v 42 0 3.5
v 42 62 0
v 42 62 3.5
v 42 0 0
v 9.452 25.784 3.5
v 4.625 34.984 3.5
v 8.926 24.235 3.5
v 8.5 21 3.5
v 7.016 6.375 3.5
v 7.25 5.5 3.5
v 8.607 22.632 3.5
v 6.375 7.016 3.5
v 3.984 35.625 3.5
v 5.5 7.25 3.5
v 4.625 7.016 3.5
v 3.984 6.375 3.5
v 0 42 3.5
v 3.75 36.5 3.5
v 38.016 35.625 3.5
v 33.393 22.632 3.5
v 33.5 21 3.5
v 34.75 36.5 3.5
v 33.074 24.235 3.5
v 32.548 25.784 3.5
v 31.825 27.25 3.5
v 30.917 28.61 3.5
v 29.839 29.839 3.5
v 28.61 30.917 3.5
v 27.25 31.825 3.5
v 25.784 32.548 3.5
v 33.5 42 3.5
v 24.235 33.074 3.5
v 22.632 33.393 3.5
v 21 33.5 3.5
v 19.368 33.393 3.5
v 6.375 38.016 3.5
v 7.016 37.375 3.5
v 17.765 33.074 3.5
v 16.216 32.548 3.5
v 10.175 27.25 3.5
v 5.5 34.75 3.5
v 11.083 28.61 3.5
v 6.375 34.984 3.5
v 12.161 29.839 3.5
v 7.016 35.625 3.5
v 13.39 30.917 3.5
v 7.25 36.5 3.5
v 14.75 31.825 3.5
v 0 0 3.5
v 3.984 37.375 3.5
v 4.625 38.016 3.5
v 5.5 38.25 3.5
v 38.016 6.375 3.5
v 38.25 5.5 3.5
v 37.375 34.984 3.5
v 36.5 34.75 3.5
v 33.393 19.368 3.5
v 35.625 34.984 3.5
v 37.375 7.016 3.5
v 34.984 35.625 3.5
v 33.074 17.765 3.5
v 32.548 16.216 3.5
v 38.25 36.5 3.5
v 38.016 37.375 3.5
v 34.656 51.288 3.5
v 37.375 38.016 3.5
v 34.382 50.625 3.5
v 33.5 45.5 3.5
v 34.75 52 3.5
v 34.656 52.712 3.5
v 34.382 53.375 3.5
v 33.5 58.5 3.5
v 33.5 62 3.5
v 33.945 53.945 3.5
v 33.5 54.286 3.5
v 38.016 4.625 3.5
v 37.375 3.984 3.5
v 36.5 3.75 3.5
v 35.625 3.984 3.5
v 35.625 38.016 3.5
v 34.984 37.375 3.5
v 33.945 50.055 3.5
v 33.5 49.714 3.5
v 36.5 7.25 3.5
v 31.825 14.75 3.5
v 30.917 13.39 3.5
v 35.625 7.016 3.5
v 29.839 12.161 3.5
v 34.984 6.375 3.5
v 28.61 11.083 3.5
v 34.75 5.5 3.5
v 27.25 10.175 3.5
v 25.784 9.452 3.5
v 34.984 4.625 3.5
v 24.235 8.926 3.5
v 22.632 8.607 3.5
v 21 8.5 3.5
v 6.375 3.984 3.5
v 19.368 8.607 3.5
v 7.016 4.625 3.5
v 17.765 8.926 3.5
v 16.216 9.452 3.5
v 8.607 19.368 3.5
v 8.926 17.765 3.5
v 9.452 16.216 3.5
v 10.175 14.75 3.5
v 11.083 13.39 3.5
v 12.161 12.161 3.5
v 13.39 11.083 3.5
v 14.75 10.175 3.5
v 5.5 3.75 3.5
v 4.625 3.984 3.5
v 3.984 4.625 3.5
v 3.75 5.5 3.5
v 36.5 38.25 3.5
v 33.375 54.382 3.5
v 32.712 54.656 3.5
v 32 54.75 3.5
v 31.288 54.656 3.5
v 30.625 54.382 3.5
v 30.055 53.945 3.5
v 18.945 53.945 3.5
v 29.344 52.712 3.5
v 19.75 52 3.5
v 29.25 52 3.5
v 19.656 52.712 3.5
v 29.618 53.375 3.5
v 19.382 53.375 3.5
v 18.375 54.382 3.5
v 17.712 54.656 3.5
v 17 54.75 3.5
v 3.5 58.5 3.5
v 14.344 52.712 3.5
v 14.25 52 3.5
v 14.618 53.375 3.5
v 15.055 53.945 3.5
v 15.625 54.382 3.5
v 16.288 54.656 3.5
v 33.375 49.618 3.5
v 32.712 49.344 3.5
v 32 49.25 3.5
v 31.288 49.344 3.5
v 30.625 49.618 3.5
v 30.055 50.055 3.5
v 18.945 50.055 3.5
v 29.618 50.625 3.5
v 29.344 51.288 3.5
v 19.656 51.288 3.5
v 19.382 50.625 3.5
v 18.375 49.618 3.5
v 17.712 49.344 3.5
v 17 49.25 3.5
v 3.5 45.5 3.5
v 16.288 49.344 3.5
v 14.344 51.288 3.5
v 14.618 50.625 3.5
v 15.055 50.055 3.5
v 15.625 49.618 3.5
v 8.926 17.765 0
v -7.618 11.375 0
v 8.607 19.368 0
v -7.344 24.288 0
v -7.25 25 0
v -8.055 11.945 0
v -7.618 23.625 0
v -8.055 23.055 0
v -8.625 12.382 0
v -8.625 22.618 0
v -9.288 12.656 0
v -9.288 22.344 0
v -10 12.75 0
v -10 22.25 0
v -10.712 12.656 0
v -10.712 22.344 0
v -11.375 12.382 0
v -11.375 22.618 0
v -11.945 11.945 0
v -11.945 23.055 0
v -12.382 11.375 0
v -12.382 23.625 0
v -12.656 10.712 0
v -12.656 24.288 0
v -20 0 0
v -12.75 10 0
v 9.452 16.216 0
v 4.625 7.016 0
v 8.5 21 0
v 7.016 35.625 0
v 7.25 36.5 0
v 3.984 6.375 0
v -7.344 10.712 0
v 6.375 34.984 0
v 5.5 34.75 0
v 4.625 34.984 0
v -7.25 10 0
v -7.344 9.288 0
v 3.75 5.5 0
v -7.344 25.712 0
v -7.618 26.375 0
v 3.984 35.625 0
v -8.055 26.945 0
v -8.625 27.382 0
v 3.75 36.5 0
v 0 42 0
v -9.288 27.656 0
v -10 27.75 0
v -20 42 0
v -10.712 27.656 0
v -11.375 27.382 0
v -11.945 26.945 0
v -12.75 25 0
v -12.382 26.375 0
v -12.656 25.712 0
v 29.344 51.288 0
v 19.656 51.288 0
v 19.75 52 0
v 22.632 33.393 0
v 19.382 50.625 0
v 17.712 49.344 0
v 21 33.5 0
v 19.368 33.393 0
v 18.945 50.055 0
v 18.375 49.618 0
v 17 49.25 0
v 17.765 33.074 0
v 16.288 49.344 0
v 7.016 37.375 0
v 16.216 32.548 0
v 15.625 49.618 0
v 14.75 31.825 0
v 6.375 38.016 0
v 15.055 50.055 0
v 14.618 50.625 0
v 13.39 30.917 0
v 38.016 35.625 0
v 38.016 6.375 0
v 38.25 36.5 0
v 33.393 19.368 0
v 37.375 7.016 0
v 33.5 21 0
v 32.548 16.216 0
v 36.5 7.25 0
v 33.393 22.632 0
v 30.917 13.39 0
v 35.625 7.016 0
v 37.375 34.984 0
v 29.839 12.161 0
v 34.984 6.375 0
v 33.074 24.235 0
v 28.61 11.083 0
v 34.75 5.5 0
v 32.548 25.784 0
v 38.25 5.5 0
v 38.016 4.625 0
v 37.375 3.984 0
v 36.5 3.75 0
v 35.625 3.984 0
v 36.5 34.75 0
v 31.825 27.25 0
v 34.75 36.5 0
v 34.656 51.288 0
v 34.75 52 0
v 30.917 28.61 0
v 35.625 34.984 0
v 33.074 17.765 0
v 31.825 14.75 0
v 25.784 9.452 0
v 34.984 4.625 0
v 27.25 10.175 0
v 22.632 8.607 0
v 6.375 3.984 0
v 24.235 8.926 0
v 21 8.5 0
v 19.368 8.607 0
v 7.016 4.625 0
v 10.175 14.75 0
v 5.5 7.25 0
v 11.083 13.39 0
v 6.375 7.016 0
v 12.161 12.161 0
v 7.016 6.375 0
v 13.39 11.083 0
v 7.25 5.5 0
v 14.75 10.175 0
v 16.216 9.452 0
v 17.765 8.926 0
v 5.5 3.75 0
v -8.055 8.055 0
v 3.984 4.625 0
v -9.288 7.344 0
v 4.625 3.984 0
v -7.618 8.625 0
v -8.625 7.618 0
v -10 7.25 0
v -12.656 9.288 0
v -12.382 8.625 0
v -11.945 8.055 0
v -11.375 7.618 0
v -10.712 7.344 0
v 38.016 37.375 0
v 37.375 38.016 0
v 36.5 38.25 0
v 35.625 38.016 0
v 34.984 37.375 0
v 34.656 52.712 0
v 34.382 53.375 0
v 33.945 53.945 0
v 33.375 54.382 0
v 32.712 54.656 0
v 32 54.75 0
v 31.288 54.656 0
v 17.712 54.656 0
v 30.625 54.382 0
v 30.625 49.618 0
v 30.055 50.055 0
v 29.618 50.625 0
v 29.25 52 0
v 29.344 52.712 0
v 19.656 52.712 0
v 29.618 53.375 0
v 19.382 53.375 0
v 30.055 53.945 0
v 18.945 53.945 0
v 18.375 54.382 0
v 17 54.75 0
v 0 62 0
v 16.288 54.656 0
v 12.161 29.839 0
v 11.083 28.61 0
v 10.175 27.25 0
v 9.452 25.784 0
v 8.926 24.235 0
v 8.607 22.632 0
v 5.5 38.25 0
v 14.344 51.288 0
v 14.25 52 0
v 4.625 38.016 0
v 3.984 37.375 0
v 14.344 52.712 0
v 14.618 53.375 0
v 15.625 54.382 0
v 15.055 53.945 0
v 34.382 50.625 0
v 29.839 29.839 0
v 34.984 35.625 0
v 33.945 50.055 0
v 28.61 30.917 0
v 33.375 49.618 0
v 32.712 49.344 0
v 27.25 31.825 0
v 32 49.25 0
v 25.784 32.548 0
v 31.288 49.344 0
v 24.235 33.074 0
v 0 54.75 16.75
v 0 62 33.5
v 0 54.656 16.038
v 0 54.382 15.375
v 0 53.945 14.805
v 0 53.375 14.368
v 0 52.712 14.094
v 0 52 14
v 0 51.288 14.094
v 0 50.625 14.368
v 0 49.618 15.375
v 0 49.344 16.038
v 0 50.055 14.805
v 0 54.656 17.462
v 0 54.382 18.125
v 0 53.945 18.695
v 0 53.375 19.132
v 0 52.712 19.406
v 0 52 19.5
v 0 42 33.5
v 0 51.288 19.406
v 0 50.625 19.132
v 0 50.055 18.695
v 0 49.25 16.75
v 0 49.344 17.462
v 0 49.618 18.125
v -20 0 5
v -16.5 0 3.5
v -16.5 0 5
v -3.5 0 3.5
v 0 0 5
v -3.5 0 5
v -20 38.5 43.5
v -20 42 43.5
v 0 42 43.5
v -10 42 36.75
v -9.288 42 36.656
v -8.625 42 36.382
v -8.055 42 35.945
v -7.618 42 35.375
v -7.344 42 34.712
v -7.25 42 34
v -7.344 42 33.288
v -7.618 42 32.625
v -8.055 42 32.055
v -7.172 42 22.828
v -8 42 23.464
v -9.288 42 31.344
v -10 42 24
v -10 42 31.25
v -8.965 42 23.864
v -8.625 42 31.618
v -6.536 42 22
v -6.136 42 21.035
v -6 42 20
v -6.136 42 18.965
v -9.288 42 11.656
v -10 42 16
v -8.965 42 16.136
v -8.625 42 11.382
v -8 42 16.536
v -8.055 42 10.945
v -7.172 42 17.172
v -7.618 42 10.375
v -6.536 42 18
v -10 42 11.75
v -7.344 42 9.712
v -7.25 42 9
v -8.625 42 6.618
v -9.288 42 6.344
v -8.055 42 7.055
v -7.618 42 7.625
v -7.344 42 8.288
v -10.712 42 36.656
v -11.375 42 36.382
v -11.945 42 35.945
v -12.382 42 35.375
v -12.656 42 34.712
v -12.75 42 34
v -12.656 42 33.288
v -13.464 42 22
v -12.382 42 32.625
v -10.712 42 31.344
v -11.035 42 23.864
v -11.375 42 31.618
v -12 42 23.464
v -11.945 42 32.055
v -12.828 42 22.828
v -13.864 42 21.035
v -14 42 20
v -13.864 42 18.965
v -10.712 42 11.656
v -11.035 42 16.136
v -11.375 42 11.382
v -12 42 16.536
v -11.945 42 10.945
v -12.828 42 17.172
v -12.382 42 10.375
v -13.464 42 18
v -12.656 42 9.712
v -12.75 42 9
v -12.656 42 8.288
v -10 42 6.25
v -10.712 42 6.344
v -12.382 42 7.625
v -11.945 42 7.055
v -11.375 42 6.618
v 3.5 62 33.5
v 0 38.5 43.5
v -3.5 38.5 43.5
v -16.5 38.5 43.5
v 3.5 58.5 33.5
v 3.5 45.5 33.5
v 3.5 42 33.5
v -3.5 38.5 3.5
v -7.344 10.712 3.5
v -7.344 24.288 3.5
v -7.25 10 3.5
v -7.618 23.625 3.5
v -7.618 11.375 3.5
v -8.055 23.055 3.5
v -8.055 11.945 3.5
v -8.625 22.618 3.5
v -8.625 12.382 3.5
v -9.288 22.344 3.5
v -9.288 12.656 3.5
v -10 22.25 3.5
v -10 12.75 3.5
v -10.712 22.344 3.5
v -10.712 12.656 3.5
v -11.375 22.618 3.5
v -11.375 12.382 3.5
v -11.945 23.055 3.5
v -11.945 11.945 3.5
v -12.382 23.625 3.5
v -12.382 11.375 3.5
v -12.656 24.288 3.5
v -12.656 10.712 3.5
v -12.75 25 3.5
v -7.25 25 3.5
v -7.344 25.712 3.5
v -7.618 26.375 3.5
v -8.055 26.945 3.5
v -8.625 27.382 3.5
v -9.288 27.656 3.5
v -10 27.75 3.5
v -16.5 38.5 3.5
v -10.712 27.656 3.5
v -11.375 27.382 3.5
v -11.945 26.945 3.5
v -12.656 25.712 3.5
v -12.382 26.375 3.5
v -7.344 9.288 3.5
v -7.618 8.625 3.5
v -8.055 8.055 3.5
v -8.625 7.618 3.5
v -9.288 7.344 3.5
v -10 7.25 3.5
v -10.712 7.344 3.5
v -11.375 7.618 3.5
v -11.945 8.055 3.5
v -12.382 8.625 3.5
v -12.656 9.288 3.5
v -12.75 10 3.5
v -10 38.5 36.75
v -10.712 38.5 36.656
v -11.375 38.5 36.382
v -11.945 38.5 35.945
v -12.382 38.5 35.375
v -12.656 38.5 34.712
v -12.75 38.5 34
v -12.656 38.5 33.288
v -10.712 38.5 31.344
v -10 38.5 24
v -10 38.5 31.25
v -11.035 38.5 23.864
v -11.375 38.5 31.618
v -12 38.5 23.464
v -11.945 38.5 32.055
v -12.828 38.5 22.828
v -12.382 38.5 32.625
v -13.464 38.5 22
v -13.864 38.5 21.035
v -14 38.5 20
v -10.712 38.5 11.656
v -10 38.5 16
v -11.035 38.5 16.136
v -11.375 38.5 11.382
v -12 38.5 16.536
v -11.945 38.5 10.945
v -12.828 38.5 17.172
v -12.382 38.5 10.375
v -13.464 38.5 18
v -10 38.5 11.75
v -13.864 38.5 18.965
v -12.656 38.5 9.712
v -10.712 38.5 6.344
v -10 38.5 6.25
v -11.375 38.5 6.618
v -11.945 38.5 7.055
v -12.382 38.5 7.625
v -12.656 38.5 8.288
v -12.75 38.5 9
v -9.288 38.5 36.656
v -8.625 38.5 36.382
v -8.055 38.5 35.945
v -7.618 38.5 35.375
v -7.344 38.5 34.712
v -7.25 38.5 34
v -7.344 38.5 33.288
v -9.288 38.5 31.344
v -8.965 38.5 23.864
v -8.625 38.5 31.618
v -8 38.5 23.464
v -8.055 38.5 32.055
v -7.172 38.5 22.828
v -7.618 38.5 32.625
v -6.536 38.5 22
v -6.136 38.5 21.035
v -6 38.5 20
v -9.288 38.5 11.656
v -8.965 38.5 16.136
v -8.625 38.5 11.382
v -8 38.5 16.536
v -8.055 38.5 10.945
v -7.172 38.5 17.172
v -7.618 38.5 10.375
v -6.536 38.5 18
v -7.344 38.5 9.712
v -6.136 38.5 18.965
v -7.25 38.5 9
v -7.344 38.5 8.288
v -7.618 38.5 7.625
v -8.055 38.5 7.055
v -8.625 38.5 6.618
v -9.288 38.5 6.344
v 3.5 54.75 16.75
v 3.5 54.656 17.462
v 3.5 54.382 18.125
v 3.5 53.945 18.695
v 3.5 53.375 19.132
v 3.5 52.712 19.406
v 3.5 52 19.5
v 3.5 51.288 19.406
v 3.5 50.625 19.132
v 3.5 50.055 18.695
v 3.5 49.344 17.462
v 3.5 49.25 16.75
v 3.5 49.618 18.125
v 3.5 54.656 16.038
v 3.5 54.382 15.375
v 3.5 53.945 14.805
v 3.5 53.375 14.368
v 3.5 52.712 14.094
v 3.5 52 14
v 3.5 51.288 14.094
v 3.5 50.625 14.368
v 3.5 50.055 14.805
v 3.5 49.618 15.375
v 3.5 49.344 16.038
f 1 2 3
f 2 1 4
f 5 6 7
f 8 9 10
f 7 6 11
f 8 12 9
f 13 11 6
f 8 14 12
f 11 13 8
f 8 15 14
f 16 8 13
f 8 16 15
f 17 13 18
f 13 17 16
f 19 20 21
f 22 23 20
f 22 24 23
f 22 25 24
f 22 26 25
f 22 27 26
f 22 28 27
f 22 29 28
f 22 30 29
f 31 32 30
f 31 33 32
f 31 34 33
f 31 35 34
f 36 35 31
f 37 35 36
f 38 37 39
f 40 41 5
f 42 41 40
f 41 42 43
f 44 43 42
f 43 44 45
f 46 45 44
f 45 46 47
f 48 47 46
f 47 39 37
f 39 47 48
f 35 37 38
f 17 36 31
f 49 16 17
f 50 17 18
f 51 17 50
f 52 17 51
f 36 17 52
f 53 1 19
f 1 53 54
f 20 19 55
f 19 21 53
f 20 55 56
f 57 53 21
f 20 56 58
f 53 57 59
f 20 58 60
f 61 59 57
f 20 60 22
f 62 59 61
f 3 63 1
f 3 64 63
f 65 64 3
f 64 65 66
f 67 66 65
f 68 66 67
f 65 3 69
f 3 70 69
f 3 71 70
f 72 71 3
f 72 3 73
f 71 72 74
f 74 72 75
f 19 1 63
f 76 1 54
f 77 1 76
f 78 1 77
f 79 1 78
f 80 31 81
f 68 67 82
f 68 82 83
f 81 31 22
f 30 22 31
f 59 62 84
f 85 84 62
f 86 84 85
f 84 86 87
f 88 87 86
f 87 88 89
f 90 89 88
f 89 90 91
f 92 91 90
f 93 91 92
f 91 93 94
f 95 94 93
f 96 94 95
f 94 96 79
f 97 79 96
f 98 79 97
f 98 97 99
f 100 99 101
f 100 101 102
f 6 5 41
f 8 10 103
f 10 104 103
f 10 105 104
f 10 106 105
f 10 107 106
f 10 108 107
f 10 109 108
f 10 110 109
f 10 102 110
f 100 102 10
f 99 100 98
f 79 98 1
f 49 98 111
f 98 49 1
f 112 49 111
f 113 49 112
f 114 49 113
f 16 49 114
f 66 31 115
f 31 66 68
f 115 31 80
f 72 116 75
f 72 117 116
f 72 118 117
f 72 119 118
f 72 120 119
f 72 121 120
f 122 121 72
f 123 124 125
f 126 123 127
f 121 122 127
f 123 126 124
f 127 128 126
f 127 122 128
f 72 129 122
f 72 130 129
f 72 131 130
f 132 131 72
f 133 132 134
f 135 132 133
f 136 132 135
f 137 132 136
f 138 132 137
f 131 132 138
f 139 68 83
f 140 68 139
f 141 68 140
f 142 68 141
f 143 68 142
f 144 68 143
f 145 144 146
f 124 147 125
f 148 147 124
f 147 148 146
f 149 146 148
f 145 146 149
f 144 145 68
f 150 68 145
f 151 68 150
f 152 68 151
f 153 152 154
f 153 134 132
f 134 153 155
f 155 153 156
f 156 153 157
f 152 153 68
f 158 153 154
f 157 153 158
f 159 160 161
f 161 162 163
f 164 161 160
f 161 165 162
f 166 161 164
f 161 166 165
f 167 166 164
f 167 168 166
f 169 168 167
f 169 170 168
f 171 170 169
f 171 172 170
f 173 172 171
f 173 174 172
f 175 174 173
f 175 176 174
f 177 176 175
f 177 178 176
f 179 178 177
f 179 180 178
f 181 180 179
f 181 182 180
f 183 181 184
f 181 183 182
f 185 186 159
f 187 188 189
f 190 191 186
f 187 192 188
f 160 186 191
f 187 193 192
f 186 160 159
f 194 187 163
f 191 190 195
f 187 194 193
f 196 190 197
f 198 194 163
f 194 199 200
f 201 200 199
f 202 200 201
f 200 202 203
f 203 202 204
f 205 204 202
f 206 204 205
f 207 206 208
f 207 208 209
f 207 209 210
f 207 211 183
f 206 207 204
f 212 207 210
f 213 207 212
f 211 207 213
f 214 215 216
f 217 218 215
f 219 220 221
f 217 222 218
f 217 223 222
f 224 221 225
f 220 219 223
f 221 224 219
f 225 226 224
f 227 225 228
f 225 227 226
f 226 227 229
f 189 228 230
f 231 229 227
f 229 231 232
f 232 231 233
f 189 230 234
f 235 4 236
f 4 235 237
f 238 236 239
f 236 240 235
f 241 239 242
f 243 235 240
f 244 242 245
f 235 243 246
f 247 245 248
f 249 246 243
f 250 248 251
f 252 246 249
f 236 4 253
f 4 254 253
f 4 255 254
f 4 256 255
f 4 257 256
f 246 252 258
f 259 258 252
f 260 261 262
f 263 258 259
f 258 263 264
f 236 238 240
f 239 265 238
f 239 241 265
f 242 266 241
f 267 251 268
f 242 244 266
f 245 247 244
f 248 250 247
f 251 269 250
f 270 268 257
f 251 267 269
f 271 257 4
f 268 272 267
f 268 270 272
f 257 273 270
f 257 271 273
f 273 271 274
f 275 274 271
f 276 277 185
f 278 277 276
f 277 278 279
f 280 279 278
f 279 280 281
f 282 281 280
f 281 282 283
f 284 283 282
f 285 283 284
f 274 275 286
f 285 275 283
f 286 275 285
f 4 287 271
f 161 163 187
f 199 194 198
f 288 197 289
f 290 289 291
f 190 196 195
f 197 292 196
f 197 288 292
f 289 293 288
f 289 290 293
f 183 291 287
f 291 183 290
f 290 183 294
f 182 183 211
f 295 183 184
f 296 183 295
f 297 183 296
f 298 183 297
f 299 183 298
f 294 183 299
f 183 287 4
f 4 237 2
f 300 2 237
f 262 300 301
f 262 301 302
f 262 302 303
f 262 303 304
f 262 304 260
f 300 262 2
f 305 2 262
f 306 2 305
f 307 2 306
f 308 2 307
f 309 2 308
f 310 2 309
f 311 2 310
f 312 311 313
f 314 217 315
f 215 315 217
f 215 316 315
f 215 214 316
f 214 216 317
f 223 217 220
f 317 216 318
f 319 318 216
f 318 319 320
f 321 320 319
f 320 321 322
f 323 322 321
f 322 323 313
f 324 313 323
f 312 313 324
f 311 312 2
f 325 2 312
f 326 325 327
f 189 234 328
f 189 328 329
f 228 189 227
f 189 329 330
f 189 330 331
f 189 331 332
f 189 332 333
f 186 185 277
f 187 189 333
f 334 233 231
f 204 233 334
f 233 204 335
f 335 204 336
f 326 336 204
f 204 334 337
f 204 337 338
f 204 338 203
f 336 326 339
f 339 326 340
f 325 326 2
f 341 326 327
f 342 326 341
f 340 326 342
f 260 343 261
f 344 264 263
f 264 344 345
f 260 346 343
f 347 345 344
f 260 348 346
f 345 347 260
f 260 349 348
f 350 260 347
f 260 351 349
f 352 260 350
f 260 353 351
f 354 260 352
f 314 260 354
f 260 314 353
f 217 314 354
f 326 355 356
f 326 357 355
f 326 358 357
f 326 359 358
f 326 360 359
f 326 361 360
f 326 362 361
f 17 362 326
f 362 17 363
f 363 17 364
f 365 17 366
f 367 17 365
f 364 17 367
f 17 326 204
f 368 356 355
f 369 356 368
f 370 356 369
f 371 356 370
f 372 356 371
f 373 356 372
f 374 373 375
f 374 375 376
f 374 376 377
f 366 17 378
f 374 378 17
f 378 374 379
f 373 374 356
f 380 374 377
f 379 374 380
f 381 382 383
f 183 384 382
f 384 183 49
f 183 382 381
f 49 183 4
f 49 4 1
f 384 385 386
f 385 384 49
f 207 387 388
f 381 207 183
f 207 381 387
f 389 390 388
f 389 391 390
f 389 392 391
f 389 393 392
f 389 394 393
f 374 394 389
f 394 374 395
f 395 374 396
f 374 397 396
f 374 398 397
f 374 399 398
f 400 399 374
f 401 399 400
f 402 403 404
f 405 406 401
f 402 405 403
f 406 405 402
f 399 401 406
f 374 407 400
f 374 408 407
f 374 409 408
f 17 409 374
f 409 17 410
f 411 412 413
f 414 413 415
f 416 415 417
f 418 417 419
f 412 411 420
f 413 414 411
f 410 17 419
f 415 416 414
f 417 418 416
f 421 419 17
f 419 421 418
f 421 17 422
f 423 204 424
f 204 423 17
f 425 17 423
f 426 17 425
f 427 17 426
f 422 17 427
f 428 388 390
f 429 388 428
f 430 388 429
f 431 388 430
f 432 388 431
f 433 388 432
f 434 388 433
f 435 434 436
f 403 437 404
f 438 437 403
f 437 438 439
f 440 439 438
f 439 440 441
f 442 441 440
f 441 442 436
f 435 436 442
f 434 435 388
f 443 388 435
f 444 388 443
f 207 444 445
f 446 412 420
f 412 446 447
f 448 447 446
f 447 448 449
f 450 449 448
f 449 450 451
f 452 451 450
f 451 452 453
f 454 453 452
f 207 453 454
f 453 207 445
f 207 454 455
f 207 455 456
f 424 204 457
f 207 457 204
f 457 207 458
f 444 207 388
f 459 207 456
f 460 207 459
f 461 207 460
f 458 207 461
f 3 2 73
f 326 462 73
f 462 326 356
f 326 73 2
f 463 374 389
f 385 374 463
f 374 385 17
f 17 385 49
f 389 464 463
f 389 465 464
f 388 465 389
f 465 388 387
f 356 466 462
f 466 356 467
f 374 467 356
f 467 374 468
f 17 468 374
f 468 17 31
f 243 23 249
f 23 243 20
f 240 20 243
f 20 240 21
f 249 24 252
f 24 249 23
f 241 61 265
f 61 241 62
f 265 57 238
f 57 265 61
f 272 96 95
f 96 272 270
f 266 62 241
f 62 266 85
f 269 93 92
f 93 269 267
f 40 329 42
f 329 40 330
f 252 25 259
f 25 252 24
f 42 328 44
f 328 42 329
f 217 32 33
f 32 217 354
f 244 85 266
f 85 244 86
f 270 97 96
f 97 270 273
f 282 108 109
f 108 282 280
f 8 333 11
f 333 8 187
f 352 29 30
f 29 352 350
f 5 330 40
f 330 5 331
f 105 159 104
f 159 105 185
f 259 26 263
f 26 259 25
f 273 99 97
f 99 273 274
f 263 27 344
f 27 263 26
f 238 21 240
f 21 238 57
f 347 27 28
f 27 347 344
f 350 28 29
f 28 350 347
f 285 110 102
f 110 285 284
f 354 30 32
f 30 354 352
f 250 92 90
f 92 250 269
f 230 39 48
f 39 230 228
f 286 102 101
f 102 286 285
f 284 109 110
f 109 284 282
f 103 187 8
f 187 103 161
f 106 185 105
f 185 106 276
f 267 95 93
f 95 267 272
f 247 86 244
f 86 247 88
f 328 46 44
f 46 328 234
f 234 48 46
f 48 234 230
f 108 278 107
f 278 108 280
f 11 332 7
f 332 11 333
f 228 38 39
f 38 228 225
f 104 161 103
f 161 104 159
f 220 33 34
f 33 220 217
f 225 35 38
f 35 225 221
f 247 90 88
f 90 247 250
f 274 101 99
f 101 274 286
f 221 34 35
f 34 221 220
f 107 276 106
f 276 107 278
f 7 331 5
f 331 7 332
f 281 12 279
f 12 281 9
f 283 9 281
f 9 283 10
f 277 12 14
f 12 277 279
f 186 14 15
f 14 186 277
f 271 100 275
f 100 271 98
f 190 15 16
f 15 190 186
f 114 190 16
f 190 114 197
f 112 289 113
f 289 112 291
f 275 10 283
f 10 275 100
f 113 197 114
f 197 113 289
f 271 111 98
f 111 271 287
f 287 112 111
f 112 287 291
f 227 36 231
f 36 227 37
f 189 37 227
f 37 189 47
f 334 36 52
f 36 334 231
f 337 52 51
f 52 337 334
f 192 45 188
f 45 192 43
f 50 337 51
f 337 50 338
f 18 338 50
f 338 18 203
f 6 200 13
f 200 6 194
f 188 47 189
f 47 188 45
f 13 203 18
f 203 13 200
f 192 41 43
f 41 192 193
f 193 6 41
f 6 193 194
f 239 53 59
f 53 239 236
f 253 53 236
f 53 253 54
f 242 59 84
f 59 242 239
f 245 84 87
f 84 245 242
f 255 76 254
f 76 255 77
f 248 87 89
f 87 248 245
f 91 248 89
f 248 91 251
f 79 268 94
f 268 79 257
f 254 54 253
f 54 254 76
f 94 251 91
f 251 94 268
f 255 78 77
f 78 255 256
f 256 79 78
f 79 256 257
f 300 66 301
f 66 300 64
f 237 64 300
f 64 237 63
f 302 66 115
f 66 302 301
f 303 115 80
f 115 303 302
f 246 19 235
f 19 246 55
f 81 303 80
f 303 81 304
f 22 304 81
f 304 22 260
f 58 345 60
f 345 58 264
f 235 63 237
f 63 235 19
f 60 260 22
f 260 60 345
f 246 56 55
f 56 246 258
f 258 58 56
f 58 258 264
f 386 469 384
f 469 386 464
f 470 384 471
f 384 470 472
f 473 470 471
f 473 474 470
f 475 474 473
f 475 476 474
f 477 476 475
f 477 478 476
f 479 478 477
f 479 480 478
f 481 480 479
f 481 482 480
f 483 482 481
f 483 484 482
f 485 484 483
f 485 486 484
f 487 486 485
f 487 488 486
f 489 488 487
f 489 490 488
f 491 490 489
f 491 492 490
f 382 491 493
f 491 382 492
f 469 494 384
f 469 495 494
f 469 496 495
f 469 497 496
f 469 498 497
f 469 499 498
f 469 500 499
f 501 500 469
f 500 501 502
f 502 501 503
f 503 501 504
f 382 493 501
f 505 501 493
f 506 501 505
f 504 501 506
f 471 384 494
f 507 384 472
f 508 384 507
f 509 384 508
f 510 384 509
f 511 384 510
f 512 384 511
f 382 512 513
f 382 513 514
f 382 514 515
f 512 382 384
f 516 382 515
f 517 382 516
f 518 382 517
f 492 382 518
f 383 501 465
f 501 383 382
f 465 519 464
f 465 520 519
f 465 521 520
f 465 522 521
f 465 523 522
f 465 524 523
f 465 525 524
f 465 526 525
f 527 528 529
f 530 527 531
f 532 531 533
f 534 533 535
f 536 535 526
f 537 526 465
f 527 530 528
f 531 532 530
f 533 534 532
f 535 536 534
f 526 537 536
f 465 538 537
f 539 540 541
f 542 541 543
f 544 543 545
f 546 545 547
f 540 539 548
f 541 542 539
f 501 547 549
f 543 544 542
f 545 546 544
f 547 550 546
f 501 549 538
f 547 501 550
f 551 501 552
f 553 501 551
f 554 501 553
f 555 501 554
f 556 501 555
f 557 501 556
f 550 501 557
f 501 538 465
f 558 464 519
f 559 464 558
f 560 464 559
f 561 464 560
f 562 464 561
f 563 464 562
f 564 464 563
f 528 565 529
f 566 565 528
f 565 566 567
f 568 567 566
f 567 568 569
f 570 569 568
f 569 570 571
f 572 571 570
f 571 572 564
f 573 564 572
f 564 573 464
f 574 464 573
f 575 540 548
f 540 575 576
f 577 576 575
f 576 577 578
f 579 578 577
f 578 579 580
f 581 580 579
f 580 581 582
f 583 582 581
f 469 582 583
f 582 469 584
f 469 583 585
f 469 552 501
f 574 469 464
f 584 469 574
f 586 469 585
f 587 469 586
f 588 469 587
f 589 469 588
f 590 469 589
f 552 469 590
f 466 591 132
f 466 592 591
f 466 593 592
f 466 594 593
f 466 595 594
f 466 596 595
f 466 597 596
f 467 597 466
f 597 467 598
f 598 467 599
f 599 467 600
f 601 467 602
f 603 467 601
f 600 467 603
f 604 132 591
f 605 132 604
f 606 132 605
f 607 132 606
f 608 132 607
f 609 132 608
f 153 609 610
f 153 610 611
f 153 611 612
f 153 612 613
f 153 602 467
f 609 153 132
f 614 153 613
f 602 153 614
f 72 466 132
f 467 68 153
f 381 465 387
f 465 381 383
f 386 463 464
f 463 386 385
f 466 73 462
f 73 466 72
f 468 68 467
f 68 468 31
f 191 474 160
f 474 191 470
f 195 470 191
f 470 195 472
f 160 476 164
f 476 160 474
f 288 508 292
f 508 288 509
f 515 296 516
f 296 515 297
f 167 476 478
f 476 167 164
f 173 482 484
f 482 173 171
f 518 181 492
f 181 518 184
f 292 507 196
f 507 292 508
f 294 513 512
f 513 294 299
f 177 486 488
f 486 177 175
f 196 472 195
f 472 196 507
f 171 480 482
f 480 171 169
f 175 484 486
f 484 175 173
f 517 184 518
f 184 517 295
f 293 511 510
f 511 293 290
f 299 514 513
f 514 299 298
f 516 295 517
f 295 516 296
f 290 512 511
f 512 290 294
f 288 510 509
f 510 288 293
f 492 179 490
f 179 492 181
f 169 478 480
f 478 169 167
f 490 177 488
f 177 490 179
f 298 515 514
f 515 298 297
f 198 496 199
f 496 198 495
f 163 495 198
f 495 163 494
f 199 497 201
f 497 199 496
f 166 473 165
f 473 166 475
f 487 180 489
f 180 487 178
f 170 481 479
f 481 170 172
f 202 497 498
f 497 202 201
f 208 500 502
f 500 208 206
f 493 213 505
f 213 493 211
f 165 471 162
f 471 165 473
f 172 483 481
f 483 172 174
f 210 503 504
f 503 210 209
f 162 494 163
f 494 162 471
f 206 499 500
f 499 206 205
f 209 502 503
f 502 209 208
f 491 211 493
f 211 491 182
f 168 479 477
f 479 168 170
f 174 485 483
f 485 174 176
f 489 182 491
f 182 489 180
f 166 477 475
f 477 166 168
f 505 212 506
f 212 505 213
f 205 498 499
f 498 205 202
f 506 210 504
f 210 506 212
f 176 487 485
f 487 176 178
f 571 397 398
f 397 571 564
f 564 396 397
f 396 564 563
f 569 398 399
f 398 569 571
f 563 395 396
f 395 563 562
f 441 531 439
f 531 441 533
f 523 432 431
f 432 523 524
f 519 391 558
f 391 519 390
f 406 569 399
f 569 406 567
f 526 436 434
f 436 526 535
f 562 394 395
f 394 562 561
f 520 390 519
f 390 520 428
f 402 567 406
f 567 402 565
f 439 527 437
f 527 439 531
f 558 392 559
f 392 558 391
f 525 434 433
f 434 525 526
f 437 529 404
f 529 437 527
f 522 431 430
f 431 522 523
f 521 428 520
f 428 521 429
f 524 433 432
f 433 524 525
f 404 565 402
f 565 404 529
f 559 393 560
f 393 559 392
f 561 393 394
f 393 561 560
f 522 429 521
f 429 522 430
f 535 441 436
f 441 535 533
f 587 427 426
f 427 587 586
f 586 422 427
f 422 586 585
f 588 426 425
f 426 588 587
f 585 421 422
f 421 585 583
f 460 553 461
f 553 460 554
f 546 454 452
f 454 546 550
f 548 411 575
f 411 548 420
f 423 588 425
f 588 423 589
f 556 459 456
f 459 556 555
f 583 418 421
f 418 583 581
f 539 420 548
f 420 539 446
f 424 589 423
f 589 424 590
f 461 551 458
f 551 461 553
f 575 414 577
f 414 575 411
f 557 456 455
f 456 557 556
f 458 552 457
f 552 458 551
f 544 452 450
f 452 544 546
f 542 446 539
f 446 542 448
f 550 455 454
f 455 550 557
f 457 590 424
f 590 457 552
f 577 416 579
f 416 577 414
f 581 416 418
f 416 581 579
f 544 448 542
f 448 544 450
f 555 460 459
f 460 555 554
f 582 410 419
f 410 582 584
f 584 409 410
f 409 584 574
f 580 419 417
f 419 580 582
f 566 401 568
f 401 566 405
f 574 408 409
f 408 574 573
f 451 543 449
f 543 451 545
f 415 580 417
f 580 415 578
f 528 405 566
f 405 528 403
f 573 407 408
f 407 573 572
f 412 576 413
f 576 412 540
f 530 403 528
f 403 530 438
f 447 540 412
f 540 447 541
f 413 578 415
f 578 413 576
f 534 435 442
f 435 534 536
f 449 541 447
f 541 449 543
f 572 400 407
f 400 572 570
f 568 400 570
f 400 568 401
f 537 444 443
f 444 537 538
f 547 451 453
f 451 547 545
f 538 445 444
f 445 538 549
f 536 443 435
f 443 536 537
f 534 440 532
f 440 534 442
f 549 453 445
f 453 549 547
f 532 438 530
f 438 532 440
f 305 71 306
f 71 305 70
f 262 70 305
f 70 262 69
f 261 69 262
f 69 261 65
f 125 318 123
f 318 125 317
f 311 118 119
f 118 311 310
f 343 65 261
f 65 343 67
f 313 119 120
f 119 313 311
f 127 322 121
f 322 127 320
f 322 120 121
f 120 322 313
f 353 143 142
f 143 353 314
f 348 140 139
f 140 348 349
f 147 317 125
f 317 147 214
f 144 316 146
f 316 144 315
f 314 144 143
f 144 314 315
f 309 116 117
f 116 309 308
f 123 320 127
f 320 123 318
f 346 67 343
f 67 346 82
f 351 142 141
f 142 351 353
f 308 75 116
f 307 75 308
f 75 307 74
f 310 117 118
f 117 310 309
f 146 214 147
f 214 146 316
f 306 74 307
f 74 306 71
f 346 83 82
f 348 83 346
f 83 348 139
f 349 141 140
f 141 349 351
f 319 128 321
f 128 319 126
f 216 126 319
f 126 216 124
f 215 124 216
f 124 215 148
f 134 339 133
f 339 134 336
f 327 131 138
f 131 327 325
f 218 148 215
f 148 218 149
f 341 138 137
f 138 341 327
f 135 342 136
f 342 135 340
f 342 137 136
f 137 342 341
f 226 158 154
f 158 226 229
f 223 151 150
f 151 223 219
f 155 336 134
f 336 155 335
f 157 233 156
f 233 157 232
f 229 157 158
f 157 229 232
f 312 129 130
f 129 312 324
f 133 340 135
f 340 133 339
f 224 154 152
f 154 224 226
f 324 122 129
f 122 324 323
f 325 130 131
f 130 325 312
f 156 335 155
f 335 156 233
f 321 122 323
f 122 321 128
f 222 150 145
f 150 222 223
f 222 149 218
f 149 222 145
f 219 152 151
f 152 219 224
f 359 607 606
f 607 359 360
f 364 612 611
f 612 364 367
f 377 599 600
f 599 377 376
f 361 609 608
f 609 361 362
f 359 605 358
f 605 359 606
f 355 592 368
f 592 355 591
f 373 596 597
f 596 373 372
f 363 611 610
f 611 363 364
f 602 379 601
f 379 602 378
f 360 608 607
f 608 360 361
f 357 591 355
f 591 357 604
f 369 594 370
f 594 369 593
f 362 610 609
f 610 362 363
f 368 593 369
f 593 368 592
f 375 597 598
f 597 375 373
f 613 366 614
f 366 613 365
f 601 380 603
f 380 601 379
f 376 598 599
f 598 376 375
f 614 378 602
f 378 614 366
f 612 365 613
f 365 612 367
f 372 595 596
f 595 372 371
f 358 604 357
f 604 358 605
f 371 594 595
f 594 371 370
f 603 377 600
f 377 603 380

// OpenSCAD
t=3.5;

difference()
{
    union()
    {
        cube([42,42,t]);
        
        translate([-20,0,0])
            cube([20,42,t]);
        translate([0,42,0])
            cube([42,20,t]);
        
        translate([-20,0,t])
            cube([20,42,40]);
        translate([0,42,t])
            cube([33.5,20,30]);
    }
    
    union()
    {
        translate([21,21,0])
            cylinder(d=25,h=t,$fn=48);
        
        translate([21-31/2,21-31/2,0])
            cylinder(d=3.5,h=t,$fn=12);
        translate([21-31/2,21+31/2,0])
            cylinder(d=3.5,h=t,$fn=12);
        translate([21+31/2,21-31/2,0])
            cylinder(d=3.5,h=t,$fn=12);
        translate([21+31/2,21+31/2,0])
            cylinder(d=3.5,h=t,$fn=12);
        
        translate([-20+t,0,t])
            cube([20-t*2,42-t,40]);
        translate([0+t,42+t,t])
            cube([33.5-t,20-t*2,30]);
        
        translate([-20,0,t+t-2])
            rotate([45,0,0])
                cube([20,42*sqrt(2),42*sqrt(2)]);
        translate([30+3.5,42,t+t-3.5])
            rotate([0,45+270,0])
                cube([33*sqrt(2),20,33*sqrt(2)]);
        
        translate([-10,10,0])
            cylinder(d=5.5,h=t,$fn=24);
        translate([-10,25,0])
            cylinder(d=5.5,h=t,$fn=24);
            
        translate([-10,42-t,20+14])
            rotate([270,0,0])
                cylinder(d=5.5,h=t,$fn=24);
        translate([-10,42-t,20-11])
            rotate([270,0,0])
                cylinder(d=5.5,h=t,$fn=24);
                
        translate([-10,42-t,20])
            rotate([270,0,0])
                cylinder(d=8,h=t,$fn=24);
        
        translate([42-10,42+10,0])
            cylinder(d=5.5,h=t,$fn=24);
        translate([42-25,42+10,0])
            cylinder(d=5.5,h=t,$fn=24);
            
        translate([0,42+10,t+(30-t)/2])
            rotate([0,90,0])
                cylinder(d=5.5,h=t+1,$fn=24);
    }
}
